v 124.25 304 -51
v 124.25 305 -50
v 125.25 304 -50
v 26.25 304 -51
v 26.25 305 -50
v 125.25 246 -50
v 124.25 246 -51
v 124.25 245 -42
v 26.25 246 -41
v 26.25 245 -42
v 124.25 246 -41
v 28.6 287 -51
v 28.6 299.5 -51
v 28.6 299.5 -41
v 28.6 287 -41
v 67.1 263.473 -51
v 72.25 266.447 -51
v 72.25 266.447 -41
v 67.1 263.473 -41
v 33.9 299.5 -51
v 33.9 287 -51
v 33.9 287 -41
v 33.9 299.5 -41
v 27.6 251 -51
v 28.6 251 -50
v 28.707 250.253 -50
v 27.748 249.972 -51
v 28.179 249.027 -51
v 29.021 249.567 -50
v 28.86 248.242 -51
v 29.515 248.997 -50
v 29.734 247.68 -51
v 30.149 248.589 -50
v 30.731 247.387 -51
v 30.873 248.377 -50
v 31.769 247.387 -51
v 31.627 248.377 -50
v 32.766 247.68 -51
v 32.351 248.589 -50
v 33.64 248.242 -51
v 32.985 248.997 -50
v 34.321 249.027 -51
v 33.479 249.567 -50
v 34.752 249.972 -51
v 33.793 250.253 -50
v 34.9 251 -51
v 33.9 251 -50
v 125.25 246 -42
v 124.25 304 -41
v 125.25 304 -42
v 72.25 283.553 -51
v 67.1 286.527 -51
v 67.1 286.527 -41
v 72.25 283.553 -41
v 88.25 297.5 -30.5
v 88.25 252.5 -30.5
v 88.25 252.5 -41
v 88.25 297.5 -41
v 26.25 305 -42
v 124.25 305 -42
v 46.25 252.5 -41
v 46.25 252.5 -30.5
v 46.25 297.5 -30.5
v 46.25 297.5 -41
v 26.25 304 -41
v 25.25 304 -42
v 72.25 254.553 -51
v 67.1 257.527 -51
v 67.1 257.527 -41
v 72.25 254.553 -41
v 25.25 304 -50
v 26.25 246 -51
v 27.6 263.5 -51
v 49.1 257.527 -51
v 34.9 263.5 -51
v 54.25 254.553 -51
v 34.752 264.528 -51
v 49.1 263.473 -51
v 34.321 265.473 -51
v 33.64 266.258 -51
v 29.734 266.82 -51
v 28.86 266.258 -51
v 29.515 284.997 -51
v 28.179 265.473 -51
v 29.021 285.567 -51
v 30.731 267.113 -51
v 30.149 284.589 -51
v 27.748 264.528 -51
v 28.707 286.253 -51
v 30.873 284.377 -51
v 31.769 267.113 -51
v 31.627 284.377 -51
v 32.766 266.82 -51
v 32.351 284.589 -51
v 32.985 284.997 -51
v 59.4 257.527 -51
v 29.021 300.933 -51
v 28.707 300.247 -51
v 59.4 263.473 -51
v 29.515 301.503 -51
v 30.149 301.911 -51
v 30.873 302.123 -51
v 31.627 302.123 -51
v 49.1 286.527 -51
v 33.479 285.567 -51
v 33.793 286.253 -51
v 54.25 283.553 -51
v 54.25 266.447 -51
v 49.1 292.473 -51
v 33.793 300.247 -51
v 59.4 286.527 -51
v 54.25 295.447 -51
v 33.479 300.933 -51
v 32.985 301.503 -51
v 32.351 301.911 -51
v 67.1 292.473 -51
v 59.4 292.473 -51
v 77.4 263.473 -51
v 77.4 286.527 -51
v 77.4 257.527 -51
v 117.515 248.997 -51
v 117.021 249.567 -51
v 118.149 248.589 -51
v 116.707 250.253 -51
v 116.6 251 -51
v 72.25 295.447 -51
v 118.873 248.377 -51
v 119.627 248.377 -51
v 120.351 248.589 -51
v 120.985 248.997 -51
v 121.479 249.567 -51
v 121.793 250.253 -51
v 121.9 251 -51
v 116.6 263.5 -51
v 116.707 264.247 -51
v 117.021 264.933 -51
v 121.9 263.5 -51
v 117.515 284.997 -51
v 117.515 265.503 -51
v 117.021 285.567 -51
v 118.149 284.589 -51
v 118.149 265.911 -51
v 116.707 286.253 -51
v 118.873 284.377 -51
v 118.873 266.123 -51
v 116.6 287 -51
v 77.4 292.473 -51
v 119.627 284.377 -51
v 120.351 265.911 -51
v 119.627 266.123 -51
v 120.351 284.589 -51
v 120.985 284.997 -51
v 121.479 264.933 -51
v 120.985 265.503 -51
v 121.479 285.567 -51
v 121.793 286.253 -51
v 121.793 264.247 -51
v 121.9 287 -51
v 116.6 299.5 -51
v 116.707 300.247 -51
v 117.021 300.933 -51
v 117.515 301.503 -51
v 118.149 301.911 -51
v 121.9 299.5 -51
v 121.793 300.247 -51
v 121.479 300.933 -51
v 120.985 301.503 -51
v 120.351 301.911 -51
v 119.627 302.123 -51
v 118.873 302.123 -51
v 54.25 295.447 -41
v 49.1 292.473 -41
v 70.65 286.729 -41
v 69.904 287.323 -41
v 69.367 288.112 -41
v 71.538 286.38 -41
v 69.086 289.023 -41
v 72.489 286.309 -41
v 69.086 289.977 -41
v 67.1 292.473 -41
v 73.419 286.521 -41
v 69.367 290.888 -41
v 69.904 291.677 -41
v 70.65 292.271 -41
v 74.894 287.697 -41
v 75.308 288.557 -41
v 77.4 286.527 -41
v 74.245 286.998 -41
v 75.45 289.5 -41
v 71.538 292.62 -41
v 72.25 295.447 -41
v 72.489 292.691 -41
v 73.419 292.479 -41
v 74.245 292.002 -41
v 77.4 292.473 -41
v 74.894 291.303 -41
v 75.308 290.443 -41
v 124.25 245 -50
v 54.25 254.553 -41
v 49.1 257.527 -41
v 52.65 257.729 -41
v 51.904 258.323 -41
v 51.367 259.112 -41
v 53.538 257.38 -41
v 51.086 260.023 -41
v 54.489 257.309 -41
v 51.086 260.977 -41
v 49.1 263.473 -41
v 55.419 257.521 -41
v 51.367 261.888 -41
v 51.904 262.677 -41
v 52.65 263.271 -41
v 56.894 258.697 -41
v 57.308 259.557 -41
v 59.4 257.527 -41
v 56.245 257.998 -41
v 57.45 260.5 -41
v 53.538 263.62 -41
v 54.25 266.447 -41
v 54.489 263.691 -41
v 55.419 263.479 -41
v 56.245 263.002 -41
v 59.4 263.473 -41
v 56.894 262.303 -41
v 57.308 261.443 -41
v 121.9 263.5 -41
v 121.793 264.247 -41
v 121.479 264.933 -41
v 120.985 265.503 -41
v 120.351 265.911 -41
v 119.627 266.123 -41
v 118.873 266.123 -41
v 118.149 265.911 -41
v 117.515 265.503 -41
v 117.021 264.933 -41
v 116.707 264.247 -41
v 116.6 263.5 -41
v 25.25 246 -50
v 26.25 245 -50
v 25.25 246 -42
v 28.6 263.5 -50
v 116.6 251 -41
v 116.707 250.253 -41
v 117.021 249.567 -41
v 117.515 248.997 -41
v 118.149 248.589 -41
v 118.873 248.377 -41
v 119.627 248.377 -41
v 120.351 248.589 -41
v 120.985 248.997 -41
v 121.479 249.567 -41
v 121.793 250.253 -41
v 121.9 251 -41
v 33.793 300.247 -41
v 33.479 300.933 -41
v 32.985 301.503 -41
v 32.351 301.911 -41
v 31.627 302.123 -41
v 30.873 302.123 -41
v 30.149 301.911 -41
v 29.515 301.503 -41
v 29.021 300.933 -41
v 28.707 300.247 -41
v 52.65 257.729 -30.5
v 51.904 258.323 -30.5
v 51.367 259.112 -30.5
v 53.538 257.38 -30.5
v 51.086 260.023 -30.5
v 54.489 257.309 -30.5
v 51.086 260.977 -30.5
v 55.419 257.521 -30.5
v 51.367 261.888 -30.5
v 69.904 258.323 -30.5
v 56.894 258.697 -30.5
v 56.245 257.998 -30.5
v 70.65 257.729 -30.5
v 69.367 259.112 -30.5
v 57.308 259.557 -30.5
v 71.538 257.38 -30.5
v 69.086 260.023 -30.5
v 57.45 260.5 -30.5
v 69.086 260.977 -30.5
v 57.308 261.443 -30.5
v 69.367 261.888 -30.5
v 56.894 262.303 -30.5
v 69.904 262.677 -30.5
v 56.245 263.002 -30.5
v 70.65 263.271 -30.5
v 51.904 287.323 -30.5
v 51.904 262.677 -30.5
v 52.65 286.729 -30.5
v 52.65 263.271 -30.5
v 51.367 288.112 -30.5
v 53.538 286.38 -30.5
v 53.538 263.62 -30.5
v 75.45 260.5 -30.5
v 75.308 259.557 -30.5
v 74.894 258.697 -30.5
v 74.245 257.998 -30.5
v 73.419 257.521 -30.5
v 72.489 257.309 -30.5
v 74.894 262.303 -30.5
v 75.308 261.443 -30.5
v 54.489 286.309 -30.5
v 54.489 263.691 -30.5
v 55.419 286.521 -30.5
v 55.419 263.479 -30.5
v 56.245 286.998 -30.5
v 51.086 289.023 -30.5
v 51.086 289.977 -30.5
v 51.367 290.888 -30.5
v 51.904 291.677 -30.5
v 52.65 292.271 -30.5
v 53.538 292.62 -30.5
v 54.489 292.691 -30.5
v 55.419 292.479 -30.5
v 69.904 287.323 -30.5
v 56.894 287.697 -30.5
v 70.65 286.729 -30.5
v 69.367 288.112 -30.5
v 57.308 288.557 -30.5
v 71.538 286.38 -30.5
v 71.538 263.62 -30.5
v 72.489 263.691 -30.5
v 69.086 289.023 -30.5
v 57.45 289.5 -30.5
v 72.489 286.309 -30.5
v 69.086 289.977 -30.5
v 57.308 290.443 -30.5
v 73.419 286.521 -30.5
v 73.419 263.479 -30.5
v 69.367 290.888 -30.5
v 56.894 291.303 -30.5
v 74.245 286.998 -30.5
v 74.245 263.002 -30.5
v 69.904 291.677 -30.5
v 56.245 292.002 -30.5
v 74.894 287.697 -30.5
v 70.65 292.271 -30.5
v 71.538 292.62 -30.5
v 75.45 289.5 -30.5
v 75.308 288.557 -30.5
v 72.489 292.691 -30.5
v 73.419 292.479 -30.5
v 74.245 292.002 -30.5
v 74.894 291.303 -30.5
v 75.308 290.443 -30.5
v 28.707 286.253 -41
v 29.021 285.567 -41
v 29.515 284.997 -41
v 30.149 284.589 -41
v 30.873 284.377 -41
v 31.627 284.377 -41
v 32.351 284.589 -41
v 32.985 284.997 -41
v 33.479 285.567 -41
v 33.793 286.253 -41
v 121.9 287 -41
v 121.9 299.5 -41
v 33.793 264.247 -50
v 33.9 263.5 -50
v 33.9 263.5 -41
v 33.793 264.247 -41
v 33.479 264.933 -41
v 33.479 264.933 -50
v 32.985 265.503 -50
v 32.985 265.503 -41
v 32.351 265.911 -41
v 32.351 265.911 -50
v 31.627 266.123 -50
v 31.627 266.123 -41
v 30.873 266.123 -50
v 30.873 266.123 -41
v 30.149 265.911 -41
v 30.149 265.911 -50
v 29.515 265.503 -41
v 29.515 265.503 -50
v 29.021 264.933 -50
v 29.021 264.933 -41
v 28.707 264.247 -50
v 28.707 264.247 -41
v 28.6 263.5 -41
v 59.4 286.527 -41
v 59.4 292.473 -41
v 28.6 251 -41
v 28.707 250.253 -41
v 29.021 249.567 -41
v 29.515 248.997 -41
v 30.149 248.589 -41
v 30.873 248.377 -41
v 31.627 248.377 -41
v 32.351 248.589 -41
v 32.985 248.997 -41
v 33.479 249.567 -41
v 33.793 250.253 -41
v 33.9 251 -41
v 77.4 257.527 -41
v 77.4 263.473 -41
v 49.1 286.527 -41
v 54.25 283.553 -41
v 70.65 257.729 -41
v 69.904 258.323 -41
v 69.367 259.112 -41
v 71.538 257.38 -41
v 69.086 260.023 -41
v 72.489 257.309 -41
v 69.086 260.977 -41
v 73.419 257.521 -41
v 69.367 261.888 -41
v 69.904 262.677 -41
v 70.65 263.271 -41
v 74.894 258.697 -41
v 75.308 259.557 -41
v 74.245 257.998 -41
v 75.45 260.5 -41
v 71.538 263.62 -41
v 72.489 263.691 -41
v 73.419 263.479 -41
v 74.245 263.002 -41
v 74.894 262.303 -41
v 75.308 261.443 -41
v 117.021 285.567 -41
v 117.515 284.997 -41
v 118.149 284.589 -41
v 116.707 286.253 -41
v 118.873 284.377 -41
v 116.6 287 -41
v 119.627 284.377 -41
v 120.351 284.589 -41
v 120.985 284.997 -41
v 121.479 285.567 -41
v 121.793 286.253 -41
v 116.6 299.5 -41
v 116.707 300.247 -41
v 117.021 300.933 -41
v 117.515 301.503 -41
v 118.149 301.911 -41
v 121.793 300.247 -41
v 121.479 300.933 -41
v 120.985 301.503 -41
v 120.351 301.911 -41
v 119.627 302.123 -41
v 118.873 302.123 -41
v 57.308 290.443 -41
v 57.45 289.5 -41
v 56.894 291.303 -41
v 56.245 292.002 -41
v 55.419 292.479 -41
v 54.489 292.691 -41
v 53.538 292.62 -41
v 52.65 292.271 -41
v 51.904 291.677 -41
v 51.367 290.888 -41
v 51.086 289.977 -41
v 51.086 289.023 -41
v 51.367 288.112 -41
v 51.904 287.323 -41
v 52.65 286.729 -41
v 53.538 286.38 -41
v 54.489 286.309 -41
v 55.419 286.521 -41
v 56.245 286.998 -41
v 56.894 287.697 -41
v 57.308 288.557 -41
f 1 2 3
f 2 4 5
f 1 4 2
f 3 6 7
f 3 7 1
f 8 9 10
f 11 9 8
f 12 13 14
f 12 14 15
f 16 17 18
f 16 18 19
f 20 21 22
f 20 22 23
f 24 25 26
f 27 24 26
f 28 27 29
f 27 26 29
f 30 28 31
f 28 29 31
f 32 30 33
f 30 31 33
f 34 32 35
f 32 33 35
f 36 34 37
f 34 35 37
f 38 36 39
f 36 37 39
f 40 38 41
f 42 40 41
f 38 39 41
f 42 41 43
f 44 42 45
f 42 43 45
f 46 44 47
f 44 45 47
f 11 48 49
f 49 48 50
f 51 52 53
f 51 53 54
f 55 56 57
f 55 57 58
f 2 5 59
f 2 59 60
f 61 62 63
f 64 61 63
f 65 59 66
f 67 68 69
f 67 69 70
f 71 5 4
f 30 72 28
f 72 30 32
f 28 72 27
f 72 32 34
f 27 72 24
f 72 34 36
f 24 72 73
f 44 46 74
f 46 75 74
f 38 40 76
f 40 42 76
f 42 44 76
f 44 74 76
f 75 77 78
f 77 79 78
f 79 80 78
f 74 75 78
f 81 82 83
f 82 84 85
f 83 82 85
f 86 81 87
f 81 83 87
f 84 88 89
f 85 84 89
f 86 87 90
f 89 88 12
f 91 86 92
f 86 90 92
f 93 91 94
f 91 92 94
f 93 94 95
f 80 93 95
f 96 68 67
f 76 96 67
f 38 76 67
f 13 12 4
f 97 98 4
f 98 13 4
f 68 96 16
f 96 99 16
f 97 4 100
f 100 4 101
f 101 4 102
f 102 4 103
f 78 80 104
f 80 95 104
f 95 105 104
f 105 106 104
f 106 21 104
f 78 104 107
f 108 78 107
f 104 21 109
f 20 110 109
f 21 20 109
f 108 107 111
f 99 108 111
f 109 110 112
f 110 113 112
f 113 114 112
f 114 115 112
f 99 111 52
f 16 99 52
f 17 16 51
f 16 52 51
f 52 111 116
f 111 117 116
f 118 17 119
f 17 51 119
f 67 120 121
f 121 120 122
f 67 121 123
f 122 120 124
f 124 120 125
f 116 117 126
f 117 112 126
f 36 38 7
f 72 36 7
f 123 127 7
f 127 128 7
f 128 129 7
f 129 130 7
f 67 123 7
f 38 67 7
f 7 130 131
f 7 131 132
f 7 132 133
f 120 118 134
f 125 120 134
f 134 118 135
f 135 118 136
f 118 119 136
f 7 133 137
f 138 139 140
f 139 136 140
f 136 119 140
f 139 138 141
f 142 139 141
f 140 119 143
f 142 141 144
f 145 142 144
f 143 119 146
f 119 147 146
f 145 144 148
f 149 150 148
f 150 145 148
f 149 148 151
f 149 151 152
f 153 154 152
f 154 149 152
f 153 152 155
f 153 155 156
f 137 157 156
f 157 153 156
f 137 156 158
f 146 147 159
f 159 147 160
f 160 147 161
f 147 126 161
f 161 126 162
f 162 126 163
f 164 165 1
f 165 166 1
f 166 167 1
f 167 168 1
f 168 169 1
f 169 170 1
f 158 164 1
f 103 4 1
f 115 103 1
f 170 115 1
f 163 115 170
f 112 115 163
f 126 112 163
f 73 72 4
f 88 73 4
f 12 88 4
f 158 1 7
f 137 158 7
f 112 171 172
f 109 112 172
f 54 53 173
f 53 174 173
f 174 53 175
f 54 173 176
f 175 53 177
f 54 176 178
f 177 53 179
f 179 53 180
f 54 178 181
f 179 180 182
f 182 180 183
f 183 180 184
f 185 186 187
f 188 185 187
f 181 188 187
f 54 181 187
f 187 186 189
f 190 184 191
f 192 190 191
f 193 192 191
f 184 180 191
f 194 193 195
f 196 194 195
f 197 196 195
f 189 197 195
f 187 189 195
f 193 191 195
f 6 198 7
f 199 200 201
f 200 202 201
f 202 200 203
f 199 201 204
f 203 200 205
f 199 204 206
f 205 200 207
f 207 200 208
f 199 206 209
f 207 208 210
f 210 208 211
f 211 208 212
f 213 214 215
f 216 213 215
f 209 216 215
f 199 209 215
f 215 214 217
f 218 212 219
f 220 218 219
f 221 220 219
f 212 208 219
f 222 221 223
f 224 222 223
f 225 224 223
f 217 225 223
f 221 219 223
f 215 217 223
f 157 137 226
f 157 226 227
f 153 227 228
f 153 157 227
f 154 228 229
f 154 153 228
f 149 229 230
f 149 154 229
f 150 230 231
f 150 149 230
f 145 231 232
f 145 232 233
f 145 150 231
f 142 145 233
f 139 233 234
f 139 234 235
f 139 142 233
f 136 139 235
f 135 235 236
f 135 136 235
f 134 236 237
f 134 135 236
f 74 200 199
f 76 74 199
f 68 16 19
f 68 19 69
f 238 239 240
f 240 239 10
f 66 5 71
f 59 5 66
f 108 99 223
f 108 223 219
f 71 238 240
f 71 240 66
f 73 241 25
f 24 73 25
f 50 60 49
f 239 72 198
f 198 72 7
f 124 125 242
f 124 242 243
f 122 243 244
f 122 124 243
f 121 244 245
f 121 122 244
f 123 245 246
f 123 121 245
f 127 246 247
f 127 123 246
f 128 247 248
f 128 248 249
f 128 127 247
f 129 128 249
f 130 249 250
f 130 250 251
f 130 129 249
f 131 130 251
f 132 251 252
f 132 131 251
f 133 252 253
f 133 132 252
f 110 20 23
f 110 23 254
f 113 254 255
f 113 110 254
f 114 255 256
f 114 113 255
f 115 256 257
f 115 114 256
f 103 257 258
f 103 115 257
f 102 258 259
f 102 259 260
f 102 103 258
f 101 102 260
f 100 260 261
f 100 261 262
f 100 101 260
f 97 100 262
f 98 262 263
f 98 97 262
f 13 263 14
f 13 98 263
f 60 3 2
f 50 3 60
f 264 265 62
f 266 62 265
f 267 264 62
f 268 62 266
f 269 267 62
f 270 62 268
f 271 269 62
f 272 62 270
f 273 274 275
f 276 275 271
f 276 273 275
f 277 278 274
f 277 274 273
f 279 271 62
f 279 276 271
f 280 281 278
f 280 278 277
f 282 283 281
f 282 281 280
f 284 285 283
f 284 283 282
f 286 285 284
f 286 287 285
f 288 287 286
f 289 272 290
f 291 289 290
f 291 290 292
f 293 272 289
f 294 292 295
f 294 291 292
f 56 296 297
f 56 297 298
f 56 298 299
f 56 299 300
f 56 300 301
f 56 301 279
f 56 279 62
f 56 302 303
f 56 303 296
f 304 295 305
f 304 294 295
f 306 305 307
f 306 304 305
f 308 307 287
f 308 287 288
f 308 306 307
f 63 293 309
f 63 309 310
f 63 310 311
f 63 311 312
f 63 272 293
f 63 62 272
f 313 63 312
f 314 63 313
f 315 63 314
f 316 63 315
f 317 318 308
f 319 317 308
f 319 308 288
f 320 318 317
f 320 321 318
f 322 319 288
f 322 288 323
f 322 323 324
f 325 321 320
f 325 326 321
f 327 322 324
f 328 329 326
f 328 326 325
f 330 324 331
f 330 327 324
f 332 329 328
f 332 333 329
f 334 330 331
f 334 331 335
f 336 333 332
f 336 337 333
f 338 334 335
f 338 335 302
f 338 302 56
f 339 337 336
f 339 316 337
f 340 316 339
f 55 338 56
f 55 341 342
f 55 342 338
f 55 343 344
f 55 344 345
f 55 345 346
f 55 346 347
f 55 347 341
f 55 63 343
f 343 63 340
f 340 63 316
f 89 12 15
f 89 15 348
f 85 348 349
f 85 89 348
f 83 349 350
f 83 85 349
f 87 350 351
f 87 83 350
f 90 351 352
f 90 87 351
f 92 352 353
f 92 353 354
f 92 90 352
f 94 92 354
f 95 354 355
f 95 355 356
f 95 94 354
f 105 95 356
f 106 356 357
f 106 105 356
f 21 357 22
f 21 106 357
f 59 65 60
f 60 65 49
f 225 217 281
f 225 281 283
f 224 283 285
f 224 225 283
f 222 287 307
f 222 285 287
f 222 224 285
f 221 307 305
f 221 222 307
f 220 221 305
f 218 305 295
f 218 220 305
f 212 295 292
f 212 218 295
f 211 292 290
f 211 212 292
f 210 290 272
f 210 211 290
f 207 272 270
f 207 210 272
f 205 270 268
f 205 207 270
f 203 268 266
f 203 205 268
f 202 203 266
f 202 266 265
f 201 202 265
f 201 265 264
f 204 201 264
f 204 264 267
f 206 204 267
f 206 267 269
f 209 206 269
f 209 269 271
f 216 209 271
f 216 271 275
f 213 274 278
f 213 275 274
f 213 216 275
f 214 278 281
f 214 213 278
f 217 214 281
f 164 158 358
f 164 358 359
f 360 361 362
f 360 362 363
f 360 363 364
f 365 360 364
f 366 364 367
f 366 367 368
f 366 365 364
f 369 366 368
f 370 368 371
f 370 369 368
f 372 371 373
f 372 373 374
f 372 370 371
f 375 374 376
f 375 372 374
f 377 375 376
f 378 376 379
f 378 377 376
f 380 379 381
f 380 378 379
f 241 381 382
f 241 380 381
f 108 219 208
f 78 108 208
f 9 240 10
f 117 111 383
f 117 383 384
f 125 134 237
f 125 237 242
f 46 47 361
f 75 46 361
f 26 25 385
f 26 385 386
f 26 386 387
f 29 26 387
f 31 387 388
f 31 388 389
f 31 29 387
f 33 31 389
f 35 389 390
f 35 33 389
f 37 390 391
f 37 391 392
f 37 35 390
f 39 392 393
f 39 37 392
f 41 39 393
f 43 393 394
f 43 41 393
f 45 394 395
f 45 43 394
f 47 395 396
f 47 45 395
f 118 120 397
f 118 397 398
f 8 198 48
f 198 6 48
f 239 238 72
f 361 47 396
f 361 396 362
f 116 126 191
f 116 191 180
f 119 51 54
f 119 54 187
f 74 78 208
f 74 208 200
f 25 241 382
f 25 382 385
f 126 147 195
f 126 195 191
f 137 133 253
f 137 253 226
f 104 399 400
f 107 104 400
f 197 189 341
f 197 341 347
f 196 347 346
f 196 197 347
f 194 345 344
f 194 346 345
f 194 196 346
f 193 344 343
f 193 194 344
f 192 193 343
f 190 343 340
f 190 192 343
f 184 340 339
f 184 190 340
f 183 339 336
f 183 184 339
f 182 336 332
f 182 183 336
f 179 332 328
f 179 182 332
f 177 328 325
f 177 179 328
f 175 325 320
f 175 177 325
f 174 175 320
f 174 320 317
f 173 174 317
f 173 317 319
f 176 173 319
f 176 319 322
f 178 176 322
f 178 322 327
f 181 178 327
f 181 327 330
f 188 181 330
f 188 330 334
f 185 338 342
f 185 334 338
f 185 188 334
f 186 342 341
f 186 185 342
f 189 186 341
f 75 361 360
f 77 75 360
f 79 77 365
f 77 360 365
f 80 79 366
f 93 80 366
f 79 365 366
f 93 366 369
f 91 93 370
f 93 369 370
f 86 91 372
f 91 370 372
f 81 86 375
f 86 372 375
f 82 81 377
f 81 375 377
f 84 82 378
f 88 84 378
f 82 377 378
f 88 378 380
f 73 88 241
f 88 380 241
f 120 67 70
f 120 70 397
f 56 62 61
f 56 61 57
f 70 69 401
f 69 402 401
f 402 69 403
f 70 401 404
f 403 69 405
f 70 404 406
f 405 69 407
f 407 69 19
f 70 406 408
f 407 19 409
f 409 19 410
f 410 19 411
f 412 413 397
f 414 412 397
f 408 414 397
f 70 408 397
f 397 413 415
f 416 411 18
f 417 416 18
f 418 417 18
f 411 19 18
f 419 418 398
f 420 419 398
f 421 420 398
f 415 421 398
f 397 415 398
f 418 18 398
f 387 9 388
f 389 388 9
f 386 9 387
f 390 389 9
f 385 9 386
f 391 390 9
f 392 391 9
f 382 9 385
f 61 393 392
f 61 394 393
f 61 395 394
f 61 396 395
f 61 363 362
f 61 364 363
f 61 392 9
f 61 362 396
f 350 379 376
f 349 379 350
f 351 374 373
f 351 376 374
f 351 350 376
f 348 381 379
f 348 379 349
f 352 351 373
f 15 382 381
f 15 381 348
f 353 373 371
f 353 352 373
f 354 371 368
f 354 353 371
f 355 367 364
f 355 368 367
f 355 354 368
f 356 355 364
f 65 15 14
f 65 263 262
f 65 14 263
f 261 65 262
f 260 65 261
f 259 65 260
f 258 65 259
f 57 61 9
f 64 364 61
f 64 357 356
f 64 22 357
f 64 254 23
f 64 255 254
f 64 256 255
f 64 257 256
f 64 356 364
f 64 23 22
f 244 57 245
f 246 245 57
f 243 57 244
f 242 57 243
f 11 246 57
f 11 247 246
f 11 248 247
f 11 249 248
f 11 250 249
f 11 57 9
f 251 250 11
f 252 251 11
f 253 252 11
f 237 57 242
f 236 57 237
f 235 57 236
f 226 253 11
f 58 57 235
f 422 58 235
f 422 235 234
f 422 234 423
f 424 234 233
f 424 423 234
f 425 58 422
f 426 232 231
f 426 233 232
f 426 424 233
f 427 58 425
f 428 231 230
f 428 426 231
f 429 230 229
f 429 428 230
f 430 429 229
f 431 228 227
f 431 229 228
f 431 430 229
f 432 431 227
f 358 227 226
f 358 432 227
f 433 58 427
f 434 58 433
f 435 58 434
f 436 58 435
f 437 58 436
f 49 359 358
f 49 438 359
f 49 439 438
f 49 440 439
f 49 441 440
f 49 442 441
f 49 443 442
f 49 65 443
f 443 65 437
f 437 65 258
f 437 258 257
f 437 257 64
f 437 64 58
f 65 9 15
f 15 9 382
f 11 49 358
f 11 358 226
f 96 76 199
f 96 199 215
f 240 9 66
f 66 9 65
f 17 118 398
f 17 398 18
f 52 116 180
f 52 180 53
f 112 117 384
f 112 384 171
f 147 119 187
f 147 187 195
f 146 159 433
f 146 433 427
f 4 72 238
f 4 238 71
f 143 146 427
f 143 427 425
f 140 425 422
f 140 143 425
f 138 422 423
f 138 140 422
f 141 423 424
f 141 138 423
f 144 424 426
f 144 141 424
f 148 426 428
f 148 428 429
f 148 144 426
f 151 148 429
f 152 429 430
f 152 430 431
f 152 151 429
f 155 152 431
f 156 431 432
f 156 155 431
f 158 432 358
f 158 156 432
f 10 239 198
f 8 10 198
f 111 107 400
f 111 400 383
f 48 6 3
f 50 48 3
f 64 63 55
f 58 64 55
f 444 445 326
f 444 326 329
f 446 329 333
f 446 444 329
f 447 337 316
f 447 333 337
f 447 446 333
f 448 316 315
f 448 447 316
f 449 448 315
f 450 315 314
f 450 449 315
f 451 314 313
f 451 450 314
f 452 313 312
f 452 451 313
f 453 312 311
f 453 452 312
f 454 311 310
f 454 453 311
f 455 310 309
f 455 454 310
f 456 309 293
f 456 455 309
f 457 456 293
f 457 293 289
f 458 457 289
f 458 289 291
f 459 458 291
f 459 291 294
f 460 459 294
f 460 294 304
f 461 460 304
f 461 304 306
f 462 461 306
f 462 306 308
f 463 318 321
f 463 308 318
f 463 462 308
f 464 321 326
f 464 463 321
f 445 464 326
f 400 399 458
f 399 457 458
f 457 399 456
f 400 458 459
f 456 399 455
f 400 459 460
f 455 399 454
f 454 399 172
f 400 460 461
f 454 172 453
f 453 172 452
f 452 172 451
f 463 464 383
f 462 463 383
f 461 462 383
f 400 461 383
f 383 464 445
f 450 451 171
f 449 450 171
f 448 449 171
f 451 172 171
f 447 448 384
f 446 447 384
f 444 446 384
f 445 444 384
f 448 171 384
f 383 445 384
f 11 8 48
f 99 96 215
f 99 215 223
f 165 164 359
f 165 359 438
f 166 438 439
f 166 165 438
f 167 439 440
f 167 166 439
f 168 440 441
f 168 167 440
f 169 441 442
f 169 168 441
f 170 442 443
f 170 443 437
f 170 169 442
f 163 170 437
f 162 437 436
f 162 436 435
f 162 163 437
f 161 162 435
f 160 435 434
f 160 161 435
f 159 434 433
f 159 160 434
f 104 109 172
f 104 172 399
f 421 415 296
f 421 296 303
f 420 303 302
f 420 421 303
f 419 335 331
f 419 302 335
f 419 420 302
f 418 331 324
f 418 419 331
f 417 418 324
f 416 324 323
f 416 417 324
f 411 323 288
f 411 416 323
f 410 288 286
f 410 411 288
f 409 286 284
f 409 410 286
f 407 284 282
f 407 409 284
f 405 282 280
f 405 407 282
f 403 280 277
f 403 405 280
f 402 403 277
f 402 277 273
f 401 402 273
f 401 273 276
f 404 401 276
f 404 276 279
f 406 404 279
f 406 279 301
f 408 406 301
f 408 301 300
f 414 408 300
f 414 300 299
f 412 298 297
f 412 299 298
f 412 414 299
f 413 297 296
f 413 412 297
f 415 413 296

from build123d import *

# Parameters (mm, degrees)
SKETCH072_W     = 42
SKETCH072_H     = 45
PAD036_DEPTH    = 20.5
SKETCH073_W     = 100
SKETCH073_H     = 60
PAD037_DEPTH    = 10
POCKET024_DEPTH = 10
SKETCH074_R     = 3.2
HOLE007_DEPTH   = 25
CHAMFER019_SIZE = 1
CHAMFER020_SIZE = 1


with BuildPart() as part:
    # Sketch072 → Pad036 (new body)
    with BuildSketch(Plane.XY.offset(-24)):
        with Locations((72, 274.5)):
            Rectangle(SKETCH072_W, SKETCH072_H)
    extrude(amount=-PAD036_DEPTH)

    # Sketch073 → Pad037 (join)
    with BuildSketch(Plane.XY.offset(-44.5)):
        with Locations((80, 274.5)):
            Rectangle(SKETCH073_W, SKETCH073_H)
        with BuildLine():
            ThreePointArc((121.35, 286.5), (124, 283.85), (126.65, 286.5))
            Line((126.65, 286.5), (126.65, 299))
            ThreePointArc((126.65, 299), (124, 301.65), (121.35, 299))
            Line((121.35, 299), (121.35, 286.5))
        make_face(mode=Mode.SUBTRACT)
        with BuildLine():
            ThreePointArc((121.35, 250.5), (124, 247.85), (126.65, 250.5))
            Line((126.65, 250.5), (126.65, 263))
            ThreePointArc((126.65, 263), (124, 265.65), (121.35, 263))
            Line((121.35, 263), (121.35, 250.5))
        make_face(mode=Mode.SUBTRACT)
        with BuildLine():
            ThreePointArc((33.35, 250.5), (36, 247.85), (38.65, 250.5))
            Line((38.65, 250.5), (38.65, 263))
            ThreePointArc((38.65, 263), (36, 265.65), (33.35, 263))
            Line((33.35, 263), (33.35, 250.5))
        make_face(mode=Mode.SUBTRACT)
        with BuildLine():
            ThreePointArc((33.35, 286.5), (36, 283.85), (38.65, 286.5))
            Line((38.65, 286.5), (38.65, 299))
            ThreePointArc((38.65, 299), (36, 301.65), (33.35, 299))
            Line((33.35, 299), (33.35, 286.5))
        make_face(mode=Mode.SUBTRACT)
    extrude(amount=PAD037_DEPTH)

    # Sketch075 → Pocket024 (cut)
    with BuildSketch(Plane.XY.offset(-44.5)):
        Polygon((64.15, 257.026646), (64.15, 262.973354), (59, 265.946708), (53.85, 262.973354), (53.85, 257.026646), (59, 254.053292), align=None)
        Polygon((82.15, 257.026646), (82.15, 262.973354), (77, 265.946708), (71.85, 262.973354), (71.85, 257.026646), (77, 254.053292), align=None)
        Polygon((82.15, 286.026646), (82.15, 291.973354), (77, 294.946708), (71.85, 291.973354), (71.85, 286.026646), (77, 283.053292), align=None)
        Polygon((64.15, 286.026646), (64.15, 291.973354), (59, 294.946708), (53.85, 291.973354), (53.85, 286.026646), (59, 283.053292), align=None)
    extrude(amount=POCKET024_DEPTH, mode=Mode.SUBTRACT)

    # Sketch074 → Hole007 (cut)
    with BuildSketch(Plane.XY.offset(-44)):
        with Locations((59, 289)):
            Circle(SKETCH074_R)
        with Locations((77, 289)):
            Circle(SKETCH074_R)
        with Locations((77, 260)):
            Circle(SKETCH074_R)
        with Locations((59, 260)):
            Circle(SKETCH074_R)
    extrude(amount=HOLE007_DEPTH, mode=Mode.SUBTRACT)

    # Chamfer019
    chamfer019_edges = [part.edges().sort_by_distance(p)[0] for p in [
        (30, 304.5, -39.5),
        (130, 304.5, -39.5),
        (80, 304.5, -44.5),
        (80, 304.5, -34.5),
        (30, 244.5, -39.5),
        (30, 274.5, -44.5),
        (30, 274.5, -34.5),
        (130, 244.5, -39.5),
        (80, 244.5, -44.5),
        (80, 244.5, -34.5),
        (130, 274.5, -44.5),
        (130, 274.5, -34.5),
    ]]
    chamfer(chamfer019_edges, length=CHAMFER019_SIZE)

    # Chamfer020
    chamfer020_edges = [part.edges().sort_by_distance(p)[0] for p in [
        (38.65, 250.5, -39.5),
        (36, 247.85, -44.5),
        (33.35, 256.75, -44.5),
        (38.65, 256.75, -44.5),
    ]]
    chamfer(chamfer020_edges, length=CHAMFER020_SIZE)


with BuildPart() as part_1:
    # Body001009 placement: moved
    add(part.part.moved(Location((-4.75, 0.5, -6.5))))


solid = part_1.part
